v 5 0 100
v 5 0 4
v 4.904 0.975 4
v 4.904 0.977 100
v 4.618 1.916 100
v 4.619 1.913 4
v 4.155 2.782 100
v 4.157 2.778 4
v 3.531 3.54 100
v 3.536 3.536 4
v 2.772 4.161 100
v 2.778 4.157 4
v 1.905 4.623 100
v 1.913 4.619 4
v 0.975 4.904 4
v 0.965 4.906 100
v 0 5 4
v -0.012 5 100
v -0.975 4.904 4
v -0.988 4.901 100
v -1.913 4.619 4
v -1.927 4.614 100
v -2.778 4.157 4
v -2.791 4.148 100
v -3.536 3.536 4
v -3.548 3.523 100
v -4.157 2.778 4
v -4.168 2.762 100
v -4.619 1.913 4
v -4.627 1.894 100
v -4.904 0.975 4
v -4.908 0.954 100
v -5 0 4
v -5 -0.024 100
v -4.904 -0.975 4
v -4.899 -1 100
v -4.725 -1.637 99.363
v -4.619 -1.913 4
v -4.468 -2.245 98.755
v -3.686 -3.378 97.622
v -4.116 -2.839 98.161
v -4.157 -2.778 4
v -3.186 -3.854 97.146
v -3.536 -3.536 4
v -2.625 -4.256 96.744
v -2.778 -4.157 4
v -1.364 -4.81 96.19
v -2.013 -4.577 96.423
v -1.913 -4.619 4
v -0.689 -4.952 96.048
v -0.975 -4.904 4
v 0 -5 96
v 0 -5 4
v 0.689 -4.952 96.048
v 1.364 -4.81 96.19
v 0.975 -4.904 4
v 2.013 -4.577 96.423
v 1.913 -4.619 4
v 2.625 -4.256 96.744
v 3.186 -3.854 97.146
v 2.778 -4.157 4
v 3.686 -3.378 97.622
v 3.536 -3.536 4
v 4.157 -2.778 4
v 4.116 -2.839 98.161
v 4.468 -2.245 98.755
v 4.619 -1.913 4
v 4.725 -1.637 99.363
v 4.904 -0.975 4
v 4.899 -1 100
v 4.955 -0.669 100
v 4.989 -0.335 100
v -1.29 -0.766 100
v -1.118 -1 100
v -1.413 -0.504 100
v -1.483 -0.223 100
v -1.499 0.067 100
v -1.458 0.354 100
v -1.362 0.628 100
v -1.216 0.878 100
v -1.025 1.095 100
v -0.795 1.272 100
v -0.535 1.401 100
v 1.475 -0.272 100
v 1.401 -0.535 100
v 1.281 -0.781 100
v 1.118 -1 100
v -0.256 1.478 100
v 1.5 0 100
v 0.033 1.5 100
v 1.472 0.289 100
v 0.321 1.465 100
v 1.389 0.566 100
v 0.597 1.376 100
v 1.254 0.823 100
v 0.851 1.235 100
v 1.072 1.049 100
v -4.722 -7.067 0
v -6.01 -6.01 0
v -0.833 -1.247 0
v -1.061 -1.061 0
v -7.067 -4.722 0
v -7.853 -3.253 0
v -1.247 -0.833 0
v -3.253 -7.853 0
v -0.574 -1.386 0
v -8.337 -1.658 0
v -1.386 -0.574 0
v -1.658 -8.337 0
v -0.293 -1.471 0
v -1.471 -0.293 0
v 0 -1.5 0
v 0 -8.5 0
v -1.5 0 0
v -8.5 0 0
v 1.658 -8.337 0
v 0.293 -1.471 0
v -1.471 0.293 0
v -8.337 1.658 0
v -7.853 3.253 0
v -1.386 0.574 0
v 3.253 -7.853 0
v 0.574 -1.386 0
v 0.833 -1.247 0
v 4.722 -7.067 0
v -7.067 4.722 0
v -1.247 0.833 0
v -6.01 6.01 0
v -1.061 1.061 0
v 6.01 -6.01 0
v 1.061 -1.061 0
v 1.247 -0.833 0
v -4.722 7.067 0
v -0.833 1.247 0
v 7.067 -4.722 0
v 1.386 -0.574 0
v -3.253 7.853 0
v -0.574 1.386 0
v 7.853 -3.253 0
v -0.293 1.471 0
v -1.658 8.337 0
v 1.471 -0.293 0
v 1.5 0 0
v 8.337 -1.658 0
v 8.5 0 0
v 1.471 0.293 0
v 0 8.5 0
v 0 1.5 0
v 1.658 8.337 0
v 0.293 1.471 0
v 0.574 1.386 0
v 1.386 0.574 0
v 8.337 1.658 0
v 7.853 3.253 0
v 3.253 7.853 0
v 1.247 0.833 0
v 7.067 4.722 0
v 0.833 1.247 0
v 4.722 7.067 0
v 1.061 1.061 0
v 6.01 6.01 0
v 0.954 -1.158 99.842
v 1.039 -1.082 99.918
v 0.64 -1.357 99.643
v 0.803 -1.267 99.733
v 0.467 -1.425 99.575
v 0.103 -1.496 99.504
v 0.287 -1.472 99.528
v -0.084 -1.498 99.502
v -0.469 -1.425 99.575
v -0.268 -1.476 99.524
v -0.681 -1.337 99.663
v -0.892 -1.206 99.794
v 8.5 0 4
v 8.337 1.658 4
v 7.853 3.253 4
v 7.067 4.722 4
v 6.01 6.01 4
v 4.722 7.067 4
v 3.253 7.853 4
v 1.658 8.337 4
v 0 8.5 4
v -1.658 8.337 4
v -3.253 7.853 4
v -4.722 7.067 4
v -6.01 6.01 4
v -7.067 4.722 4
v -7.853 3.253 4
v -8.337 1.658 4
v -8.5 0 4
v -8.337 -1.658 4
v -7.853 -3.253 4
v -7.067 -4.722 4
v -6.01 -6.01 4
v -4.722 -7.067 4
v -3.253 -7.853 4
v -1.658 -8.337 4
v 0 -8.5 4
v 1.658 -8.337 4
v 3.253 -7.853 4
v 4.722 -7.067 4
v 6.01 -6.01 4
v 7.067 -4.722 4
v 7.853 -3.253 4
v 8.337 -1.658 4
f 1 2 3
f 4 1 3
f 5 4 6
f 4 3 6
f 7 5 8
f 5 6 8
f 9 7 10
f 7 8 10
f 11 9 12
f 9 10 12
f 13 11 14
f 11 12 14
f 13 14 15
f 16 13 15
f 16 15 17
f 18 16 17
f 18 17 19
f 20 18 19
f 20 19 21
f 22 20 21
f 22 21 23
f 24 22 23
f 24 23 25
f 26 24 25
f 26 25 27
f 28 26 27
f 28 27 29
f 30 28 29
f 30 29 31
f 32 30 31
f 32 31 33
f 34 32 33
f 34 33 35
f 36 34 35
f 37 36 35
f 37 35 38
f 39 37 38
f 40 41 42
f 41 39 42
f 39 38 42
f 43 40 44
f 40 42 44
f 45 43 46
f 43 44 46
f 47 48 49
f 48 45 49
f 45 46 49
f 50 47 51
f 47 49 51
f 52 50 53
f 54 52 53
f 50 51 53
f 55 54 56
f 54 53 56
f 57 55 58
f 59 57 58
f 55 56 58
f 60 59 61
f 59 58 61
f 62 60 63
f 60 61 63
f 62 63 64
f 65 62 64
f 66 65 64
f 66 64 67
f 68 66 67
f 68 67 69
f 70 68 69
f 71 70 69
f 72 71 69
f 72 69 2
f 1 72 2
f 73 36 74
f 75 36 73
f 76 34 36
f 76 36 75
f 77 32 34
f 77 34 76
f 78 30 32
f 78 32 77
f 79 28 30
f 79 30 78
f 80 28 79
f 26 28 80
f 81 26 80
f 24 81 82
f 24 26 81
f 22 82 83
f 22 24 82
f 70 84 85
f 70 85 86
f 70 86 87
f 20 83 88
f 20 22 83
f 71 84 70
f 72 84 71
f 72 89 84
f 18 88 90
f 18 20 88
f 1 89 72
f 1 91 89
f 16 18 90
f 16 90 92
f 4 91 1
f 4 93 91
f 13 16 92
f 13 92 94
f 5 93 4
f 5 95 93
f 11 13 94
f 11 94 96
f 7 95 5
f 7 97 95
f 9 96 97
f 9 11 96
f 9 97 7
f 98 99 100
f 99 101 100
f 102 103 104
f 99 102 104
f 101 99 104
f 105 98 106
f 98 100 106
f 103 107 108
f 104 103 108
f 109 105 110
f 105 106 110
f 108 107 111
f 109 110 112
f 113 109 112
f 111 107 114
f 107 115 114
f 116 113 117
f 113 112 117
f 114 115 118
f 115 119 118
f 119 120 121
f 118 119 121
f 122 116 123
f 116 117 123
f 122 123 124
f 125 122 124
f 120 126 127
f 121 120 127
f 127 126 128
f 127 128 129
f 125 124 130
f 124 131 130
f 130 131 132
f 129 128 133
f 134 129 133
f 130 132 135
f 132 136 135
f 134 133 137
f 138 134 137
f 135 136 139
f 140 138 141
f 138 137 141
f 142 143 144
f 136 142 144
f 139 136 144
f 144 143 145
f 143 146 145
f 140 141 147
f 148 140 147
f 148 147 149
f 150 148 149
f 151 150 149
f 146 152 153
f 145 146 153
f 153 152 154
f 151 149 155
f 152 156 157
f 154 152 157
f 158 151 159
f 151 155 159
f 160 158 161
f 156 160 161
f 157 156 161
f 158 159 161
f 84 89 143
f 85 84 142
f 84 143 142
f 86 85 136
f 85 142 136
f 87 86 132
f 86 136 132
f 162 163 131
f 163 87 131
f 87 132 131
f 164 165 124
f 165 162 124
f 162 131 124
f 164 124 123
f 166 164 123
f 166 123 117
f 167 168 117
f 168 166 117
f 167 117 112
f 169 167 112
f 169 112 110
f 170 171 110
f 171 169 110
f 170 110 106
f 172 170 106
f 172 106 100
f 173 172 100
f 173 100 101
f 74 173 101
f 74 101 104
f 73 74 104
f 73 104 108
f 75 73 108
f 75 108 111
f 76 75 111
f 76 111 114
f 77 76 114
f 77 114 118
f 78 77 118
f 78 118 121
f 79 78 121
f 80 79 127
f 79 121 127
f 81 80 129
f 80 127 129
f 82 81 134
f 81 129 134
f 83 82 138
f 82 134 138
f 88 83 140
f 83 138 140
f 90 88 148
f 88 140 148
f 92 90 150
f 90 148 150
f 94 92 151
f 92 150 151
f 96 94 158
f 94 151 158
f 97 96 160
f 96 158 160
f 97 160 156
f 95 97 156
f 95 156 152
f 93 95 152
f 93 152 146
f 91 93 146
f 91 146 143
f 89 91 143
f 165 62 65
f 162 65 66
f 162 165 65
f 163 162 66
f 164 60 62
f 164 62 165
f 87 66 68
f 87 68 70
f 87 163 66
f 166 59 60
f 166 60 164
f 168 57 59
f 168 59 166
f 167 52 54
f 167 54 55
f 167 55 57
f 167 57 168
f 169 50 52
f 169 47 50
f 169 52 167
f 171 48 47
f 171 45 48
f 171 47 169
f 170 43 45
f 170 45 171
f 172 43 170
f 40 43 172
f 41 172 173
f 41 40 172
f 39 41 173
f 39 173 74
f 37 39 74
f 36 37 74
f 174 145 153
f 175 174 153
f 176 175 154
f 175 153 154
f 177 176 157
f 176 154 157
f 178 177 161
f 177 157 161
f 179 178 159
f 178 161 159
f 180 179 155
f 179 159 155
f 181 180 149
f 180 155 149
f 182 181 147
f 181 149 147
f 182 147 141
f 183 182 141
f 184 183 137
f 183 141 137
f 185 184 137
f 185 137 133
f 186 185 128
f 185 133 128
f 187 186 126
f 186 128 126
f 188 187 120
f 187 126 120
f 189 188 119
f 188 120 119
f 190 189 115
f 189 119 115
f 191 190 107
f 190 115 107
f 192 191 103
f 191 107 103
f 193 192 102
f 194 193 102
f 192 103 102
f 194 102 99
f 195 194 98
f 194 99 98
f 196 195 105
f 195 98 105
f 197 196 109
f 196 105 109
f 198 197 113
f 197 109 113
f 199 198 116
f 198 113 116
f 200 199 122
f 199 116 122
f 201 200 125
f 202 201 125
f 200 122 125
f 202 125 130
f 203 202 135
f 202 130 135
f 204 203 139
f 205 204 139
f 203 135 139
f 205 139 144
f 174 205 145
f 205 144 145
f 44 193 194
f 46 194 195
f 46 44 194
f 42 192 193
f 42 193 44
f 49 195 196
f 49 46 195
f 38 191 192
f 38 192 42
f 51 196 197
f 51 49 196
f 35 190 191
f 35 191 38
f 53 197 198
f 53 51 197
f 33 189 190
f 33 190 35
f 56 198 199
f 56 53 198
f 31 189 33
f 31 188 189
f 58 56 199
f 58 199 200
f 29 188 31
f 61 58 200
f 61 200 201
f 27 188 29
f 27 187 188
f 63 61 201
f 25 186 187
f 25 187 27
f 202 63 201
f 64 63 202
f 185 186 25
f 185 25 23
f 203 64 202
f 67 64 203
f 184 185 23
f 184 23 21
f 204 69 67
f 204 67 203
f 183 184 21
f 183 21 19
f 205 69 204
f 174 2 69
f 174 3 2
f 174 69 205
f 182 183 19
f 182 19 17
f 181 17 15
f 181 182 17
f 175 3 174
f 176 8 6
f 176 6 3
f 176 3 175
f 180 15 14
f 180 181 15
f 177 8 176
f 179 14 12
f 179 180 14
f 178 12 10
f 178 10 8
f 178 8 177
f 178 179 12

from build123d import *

# Parameters (mm, degrees)
F0_R          = 8.5
F1_DEPTH      = 4
F2_R          = 5
F3_DEPTH      = 100
F5_DEPTH      = 25
F5_DEPTH_BACK = 25
F6_R          = 1.5
F7_DEPTH      = 130.6


with BuildPart() as f1:
    # F0 (on Top) → F1 (new body)
    with BuildSketch(Plane.XY):
        Circle(F0_R)
    extrude(amount=F1_DEPTH)

    # F2 (on Top) → F3 (join)
    with BuildSketch(Plane.XY):
        Circle(F2_R)
    extrude(amount=F3_DEPTH)

    # F4 (on Right) → F5 (cut, two sides)
    with BuildSketch(Plane.YZ) as f5_sk:
        Polygon((0, 101), (-5, 101), (-5, 96), align=None)
    extrude(amount=F5_DEPTH, mode=Mode.SUBTRACT)
    extrude(f5_sk.sketch, amount=-F5_DEPTH_BACK, mode=Mode.SUBTRACT)

    # F6 (on face) → F7 (cut)
    with BuildSketch(Plane(origin=(0, 0, 0), x_dir=(1, 0, 0), z_dir=(0, 0, -1))):
        Circle(F6_R)
    extrude(amount=-F7_DEPTH, mode=Mode.SUBTRACT)


solid = f1.part
